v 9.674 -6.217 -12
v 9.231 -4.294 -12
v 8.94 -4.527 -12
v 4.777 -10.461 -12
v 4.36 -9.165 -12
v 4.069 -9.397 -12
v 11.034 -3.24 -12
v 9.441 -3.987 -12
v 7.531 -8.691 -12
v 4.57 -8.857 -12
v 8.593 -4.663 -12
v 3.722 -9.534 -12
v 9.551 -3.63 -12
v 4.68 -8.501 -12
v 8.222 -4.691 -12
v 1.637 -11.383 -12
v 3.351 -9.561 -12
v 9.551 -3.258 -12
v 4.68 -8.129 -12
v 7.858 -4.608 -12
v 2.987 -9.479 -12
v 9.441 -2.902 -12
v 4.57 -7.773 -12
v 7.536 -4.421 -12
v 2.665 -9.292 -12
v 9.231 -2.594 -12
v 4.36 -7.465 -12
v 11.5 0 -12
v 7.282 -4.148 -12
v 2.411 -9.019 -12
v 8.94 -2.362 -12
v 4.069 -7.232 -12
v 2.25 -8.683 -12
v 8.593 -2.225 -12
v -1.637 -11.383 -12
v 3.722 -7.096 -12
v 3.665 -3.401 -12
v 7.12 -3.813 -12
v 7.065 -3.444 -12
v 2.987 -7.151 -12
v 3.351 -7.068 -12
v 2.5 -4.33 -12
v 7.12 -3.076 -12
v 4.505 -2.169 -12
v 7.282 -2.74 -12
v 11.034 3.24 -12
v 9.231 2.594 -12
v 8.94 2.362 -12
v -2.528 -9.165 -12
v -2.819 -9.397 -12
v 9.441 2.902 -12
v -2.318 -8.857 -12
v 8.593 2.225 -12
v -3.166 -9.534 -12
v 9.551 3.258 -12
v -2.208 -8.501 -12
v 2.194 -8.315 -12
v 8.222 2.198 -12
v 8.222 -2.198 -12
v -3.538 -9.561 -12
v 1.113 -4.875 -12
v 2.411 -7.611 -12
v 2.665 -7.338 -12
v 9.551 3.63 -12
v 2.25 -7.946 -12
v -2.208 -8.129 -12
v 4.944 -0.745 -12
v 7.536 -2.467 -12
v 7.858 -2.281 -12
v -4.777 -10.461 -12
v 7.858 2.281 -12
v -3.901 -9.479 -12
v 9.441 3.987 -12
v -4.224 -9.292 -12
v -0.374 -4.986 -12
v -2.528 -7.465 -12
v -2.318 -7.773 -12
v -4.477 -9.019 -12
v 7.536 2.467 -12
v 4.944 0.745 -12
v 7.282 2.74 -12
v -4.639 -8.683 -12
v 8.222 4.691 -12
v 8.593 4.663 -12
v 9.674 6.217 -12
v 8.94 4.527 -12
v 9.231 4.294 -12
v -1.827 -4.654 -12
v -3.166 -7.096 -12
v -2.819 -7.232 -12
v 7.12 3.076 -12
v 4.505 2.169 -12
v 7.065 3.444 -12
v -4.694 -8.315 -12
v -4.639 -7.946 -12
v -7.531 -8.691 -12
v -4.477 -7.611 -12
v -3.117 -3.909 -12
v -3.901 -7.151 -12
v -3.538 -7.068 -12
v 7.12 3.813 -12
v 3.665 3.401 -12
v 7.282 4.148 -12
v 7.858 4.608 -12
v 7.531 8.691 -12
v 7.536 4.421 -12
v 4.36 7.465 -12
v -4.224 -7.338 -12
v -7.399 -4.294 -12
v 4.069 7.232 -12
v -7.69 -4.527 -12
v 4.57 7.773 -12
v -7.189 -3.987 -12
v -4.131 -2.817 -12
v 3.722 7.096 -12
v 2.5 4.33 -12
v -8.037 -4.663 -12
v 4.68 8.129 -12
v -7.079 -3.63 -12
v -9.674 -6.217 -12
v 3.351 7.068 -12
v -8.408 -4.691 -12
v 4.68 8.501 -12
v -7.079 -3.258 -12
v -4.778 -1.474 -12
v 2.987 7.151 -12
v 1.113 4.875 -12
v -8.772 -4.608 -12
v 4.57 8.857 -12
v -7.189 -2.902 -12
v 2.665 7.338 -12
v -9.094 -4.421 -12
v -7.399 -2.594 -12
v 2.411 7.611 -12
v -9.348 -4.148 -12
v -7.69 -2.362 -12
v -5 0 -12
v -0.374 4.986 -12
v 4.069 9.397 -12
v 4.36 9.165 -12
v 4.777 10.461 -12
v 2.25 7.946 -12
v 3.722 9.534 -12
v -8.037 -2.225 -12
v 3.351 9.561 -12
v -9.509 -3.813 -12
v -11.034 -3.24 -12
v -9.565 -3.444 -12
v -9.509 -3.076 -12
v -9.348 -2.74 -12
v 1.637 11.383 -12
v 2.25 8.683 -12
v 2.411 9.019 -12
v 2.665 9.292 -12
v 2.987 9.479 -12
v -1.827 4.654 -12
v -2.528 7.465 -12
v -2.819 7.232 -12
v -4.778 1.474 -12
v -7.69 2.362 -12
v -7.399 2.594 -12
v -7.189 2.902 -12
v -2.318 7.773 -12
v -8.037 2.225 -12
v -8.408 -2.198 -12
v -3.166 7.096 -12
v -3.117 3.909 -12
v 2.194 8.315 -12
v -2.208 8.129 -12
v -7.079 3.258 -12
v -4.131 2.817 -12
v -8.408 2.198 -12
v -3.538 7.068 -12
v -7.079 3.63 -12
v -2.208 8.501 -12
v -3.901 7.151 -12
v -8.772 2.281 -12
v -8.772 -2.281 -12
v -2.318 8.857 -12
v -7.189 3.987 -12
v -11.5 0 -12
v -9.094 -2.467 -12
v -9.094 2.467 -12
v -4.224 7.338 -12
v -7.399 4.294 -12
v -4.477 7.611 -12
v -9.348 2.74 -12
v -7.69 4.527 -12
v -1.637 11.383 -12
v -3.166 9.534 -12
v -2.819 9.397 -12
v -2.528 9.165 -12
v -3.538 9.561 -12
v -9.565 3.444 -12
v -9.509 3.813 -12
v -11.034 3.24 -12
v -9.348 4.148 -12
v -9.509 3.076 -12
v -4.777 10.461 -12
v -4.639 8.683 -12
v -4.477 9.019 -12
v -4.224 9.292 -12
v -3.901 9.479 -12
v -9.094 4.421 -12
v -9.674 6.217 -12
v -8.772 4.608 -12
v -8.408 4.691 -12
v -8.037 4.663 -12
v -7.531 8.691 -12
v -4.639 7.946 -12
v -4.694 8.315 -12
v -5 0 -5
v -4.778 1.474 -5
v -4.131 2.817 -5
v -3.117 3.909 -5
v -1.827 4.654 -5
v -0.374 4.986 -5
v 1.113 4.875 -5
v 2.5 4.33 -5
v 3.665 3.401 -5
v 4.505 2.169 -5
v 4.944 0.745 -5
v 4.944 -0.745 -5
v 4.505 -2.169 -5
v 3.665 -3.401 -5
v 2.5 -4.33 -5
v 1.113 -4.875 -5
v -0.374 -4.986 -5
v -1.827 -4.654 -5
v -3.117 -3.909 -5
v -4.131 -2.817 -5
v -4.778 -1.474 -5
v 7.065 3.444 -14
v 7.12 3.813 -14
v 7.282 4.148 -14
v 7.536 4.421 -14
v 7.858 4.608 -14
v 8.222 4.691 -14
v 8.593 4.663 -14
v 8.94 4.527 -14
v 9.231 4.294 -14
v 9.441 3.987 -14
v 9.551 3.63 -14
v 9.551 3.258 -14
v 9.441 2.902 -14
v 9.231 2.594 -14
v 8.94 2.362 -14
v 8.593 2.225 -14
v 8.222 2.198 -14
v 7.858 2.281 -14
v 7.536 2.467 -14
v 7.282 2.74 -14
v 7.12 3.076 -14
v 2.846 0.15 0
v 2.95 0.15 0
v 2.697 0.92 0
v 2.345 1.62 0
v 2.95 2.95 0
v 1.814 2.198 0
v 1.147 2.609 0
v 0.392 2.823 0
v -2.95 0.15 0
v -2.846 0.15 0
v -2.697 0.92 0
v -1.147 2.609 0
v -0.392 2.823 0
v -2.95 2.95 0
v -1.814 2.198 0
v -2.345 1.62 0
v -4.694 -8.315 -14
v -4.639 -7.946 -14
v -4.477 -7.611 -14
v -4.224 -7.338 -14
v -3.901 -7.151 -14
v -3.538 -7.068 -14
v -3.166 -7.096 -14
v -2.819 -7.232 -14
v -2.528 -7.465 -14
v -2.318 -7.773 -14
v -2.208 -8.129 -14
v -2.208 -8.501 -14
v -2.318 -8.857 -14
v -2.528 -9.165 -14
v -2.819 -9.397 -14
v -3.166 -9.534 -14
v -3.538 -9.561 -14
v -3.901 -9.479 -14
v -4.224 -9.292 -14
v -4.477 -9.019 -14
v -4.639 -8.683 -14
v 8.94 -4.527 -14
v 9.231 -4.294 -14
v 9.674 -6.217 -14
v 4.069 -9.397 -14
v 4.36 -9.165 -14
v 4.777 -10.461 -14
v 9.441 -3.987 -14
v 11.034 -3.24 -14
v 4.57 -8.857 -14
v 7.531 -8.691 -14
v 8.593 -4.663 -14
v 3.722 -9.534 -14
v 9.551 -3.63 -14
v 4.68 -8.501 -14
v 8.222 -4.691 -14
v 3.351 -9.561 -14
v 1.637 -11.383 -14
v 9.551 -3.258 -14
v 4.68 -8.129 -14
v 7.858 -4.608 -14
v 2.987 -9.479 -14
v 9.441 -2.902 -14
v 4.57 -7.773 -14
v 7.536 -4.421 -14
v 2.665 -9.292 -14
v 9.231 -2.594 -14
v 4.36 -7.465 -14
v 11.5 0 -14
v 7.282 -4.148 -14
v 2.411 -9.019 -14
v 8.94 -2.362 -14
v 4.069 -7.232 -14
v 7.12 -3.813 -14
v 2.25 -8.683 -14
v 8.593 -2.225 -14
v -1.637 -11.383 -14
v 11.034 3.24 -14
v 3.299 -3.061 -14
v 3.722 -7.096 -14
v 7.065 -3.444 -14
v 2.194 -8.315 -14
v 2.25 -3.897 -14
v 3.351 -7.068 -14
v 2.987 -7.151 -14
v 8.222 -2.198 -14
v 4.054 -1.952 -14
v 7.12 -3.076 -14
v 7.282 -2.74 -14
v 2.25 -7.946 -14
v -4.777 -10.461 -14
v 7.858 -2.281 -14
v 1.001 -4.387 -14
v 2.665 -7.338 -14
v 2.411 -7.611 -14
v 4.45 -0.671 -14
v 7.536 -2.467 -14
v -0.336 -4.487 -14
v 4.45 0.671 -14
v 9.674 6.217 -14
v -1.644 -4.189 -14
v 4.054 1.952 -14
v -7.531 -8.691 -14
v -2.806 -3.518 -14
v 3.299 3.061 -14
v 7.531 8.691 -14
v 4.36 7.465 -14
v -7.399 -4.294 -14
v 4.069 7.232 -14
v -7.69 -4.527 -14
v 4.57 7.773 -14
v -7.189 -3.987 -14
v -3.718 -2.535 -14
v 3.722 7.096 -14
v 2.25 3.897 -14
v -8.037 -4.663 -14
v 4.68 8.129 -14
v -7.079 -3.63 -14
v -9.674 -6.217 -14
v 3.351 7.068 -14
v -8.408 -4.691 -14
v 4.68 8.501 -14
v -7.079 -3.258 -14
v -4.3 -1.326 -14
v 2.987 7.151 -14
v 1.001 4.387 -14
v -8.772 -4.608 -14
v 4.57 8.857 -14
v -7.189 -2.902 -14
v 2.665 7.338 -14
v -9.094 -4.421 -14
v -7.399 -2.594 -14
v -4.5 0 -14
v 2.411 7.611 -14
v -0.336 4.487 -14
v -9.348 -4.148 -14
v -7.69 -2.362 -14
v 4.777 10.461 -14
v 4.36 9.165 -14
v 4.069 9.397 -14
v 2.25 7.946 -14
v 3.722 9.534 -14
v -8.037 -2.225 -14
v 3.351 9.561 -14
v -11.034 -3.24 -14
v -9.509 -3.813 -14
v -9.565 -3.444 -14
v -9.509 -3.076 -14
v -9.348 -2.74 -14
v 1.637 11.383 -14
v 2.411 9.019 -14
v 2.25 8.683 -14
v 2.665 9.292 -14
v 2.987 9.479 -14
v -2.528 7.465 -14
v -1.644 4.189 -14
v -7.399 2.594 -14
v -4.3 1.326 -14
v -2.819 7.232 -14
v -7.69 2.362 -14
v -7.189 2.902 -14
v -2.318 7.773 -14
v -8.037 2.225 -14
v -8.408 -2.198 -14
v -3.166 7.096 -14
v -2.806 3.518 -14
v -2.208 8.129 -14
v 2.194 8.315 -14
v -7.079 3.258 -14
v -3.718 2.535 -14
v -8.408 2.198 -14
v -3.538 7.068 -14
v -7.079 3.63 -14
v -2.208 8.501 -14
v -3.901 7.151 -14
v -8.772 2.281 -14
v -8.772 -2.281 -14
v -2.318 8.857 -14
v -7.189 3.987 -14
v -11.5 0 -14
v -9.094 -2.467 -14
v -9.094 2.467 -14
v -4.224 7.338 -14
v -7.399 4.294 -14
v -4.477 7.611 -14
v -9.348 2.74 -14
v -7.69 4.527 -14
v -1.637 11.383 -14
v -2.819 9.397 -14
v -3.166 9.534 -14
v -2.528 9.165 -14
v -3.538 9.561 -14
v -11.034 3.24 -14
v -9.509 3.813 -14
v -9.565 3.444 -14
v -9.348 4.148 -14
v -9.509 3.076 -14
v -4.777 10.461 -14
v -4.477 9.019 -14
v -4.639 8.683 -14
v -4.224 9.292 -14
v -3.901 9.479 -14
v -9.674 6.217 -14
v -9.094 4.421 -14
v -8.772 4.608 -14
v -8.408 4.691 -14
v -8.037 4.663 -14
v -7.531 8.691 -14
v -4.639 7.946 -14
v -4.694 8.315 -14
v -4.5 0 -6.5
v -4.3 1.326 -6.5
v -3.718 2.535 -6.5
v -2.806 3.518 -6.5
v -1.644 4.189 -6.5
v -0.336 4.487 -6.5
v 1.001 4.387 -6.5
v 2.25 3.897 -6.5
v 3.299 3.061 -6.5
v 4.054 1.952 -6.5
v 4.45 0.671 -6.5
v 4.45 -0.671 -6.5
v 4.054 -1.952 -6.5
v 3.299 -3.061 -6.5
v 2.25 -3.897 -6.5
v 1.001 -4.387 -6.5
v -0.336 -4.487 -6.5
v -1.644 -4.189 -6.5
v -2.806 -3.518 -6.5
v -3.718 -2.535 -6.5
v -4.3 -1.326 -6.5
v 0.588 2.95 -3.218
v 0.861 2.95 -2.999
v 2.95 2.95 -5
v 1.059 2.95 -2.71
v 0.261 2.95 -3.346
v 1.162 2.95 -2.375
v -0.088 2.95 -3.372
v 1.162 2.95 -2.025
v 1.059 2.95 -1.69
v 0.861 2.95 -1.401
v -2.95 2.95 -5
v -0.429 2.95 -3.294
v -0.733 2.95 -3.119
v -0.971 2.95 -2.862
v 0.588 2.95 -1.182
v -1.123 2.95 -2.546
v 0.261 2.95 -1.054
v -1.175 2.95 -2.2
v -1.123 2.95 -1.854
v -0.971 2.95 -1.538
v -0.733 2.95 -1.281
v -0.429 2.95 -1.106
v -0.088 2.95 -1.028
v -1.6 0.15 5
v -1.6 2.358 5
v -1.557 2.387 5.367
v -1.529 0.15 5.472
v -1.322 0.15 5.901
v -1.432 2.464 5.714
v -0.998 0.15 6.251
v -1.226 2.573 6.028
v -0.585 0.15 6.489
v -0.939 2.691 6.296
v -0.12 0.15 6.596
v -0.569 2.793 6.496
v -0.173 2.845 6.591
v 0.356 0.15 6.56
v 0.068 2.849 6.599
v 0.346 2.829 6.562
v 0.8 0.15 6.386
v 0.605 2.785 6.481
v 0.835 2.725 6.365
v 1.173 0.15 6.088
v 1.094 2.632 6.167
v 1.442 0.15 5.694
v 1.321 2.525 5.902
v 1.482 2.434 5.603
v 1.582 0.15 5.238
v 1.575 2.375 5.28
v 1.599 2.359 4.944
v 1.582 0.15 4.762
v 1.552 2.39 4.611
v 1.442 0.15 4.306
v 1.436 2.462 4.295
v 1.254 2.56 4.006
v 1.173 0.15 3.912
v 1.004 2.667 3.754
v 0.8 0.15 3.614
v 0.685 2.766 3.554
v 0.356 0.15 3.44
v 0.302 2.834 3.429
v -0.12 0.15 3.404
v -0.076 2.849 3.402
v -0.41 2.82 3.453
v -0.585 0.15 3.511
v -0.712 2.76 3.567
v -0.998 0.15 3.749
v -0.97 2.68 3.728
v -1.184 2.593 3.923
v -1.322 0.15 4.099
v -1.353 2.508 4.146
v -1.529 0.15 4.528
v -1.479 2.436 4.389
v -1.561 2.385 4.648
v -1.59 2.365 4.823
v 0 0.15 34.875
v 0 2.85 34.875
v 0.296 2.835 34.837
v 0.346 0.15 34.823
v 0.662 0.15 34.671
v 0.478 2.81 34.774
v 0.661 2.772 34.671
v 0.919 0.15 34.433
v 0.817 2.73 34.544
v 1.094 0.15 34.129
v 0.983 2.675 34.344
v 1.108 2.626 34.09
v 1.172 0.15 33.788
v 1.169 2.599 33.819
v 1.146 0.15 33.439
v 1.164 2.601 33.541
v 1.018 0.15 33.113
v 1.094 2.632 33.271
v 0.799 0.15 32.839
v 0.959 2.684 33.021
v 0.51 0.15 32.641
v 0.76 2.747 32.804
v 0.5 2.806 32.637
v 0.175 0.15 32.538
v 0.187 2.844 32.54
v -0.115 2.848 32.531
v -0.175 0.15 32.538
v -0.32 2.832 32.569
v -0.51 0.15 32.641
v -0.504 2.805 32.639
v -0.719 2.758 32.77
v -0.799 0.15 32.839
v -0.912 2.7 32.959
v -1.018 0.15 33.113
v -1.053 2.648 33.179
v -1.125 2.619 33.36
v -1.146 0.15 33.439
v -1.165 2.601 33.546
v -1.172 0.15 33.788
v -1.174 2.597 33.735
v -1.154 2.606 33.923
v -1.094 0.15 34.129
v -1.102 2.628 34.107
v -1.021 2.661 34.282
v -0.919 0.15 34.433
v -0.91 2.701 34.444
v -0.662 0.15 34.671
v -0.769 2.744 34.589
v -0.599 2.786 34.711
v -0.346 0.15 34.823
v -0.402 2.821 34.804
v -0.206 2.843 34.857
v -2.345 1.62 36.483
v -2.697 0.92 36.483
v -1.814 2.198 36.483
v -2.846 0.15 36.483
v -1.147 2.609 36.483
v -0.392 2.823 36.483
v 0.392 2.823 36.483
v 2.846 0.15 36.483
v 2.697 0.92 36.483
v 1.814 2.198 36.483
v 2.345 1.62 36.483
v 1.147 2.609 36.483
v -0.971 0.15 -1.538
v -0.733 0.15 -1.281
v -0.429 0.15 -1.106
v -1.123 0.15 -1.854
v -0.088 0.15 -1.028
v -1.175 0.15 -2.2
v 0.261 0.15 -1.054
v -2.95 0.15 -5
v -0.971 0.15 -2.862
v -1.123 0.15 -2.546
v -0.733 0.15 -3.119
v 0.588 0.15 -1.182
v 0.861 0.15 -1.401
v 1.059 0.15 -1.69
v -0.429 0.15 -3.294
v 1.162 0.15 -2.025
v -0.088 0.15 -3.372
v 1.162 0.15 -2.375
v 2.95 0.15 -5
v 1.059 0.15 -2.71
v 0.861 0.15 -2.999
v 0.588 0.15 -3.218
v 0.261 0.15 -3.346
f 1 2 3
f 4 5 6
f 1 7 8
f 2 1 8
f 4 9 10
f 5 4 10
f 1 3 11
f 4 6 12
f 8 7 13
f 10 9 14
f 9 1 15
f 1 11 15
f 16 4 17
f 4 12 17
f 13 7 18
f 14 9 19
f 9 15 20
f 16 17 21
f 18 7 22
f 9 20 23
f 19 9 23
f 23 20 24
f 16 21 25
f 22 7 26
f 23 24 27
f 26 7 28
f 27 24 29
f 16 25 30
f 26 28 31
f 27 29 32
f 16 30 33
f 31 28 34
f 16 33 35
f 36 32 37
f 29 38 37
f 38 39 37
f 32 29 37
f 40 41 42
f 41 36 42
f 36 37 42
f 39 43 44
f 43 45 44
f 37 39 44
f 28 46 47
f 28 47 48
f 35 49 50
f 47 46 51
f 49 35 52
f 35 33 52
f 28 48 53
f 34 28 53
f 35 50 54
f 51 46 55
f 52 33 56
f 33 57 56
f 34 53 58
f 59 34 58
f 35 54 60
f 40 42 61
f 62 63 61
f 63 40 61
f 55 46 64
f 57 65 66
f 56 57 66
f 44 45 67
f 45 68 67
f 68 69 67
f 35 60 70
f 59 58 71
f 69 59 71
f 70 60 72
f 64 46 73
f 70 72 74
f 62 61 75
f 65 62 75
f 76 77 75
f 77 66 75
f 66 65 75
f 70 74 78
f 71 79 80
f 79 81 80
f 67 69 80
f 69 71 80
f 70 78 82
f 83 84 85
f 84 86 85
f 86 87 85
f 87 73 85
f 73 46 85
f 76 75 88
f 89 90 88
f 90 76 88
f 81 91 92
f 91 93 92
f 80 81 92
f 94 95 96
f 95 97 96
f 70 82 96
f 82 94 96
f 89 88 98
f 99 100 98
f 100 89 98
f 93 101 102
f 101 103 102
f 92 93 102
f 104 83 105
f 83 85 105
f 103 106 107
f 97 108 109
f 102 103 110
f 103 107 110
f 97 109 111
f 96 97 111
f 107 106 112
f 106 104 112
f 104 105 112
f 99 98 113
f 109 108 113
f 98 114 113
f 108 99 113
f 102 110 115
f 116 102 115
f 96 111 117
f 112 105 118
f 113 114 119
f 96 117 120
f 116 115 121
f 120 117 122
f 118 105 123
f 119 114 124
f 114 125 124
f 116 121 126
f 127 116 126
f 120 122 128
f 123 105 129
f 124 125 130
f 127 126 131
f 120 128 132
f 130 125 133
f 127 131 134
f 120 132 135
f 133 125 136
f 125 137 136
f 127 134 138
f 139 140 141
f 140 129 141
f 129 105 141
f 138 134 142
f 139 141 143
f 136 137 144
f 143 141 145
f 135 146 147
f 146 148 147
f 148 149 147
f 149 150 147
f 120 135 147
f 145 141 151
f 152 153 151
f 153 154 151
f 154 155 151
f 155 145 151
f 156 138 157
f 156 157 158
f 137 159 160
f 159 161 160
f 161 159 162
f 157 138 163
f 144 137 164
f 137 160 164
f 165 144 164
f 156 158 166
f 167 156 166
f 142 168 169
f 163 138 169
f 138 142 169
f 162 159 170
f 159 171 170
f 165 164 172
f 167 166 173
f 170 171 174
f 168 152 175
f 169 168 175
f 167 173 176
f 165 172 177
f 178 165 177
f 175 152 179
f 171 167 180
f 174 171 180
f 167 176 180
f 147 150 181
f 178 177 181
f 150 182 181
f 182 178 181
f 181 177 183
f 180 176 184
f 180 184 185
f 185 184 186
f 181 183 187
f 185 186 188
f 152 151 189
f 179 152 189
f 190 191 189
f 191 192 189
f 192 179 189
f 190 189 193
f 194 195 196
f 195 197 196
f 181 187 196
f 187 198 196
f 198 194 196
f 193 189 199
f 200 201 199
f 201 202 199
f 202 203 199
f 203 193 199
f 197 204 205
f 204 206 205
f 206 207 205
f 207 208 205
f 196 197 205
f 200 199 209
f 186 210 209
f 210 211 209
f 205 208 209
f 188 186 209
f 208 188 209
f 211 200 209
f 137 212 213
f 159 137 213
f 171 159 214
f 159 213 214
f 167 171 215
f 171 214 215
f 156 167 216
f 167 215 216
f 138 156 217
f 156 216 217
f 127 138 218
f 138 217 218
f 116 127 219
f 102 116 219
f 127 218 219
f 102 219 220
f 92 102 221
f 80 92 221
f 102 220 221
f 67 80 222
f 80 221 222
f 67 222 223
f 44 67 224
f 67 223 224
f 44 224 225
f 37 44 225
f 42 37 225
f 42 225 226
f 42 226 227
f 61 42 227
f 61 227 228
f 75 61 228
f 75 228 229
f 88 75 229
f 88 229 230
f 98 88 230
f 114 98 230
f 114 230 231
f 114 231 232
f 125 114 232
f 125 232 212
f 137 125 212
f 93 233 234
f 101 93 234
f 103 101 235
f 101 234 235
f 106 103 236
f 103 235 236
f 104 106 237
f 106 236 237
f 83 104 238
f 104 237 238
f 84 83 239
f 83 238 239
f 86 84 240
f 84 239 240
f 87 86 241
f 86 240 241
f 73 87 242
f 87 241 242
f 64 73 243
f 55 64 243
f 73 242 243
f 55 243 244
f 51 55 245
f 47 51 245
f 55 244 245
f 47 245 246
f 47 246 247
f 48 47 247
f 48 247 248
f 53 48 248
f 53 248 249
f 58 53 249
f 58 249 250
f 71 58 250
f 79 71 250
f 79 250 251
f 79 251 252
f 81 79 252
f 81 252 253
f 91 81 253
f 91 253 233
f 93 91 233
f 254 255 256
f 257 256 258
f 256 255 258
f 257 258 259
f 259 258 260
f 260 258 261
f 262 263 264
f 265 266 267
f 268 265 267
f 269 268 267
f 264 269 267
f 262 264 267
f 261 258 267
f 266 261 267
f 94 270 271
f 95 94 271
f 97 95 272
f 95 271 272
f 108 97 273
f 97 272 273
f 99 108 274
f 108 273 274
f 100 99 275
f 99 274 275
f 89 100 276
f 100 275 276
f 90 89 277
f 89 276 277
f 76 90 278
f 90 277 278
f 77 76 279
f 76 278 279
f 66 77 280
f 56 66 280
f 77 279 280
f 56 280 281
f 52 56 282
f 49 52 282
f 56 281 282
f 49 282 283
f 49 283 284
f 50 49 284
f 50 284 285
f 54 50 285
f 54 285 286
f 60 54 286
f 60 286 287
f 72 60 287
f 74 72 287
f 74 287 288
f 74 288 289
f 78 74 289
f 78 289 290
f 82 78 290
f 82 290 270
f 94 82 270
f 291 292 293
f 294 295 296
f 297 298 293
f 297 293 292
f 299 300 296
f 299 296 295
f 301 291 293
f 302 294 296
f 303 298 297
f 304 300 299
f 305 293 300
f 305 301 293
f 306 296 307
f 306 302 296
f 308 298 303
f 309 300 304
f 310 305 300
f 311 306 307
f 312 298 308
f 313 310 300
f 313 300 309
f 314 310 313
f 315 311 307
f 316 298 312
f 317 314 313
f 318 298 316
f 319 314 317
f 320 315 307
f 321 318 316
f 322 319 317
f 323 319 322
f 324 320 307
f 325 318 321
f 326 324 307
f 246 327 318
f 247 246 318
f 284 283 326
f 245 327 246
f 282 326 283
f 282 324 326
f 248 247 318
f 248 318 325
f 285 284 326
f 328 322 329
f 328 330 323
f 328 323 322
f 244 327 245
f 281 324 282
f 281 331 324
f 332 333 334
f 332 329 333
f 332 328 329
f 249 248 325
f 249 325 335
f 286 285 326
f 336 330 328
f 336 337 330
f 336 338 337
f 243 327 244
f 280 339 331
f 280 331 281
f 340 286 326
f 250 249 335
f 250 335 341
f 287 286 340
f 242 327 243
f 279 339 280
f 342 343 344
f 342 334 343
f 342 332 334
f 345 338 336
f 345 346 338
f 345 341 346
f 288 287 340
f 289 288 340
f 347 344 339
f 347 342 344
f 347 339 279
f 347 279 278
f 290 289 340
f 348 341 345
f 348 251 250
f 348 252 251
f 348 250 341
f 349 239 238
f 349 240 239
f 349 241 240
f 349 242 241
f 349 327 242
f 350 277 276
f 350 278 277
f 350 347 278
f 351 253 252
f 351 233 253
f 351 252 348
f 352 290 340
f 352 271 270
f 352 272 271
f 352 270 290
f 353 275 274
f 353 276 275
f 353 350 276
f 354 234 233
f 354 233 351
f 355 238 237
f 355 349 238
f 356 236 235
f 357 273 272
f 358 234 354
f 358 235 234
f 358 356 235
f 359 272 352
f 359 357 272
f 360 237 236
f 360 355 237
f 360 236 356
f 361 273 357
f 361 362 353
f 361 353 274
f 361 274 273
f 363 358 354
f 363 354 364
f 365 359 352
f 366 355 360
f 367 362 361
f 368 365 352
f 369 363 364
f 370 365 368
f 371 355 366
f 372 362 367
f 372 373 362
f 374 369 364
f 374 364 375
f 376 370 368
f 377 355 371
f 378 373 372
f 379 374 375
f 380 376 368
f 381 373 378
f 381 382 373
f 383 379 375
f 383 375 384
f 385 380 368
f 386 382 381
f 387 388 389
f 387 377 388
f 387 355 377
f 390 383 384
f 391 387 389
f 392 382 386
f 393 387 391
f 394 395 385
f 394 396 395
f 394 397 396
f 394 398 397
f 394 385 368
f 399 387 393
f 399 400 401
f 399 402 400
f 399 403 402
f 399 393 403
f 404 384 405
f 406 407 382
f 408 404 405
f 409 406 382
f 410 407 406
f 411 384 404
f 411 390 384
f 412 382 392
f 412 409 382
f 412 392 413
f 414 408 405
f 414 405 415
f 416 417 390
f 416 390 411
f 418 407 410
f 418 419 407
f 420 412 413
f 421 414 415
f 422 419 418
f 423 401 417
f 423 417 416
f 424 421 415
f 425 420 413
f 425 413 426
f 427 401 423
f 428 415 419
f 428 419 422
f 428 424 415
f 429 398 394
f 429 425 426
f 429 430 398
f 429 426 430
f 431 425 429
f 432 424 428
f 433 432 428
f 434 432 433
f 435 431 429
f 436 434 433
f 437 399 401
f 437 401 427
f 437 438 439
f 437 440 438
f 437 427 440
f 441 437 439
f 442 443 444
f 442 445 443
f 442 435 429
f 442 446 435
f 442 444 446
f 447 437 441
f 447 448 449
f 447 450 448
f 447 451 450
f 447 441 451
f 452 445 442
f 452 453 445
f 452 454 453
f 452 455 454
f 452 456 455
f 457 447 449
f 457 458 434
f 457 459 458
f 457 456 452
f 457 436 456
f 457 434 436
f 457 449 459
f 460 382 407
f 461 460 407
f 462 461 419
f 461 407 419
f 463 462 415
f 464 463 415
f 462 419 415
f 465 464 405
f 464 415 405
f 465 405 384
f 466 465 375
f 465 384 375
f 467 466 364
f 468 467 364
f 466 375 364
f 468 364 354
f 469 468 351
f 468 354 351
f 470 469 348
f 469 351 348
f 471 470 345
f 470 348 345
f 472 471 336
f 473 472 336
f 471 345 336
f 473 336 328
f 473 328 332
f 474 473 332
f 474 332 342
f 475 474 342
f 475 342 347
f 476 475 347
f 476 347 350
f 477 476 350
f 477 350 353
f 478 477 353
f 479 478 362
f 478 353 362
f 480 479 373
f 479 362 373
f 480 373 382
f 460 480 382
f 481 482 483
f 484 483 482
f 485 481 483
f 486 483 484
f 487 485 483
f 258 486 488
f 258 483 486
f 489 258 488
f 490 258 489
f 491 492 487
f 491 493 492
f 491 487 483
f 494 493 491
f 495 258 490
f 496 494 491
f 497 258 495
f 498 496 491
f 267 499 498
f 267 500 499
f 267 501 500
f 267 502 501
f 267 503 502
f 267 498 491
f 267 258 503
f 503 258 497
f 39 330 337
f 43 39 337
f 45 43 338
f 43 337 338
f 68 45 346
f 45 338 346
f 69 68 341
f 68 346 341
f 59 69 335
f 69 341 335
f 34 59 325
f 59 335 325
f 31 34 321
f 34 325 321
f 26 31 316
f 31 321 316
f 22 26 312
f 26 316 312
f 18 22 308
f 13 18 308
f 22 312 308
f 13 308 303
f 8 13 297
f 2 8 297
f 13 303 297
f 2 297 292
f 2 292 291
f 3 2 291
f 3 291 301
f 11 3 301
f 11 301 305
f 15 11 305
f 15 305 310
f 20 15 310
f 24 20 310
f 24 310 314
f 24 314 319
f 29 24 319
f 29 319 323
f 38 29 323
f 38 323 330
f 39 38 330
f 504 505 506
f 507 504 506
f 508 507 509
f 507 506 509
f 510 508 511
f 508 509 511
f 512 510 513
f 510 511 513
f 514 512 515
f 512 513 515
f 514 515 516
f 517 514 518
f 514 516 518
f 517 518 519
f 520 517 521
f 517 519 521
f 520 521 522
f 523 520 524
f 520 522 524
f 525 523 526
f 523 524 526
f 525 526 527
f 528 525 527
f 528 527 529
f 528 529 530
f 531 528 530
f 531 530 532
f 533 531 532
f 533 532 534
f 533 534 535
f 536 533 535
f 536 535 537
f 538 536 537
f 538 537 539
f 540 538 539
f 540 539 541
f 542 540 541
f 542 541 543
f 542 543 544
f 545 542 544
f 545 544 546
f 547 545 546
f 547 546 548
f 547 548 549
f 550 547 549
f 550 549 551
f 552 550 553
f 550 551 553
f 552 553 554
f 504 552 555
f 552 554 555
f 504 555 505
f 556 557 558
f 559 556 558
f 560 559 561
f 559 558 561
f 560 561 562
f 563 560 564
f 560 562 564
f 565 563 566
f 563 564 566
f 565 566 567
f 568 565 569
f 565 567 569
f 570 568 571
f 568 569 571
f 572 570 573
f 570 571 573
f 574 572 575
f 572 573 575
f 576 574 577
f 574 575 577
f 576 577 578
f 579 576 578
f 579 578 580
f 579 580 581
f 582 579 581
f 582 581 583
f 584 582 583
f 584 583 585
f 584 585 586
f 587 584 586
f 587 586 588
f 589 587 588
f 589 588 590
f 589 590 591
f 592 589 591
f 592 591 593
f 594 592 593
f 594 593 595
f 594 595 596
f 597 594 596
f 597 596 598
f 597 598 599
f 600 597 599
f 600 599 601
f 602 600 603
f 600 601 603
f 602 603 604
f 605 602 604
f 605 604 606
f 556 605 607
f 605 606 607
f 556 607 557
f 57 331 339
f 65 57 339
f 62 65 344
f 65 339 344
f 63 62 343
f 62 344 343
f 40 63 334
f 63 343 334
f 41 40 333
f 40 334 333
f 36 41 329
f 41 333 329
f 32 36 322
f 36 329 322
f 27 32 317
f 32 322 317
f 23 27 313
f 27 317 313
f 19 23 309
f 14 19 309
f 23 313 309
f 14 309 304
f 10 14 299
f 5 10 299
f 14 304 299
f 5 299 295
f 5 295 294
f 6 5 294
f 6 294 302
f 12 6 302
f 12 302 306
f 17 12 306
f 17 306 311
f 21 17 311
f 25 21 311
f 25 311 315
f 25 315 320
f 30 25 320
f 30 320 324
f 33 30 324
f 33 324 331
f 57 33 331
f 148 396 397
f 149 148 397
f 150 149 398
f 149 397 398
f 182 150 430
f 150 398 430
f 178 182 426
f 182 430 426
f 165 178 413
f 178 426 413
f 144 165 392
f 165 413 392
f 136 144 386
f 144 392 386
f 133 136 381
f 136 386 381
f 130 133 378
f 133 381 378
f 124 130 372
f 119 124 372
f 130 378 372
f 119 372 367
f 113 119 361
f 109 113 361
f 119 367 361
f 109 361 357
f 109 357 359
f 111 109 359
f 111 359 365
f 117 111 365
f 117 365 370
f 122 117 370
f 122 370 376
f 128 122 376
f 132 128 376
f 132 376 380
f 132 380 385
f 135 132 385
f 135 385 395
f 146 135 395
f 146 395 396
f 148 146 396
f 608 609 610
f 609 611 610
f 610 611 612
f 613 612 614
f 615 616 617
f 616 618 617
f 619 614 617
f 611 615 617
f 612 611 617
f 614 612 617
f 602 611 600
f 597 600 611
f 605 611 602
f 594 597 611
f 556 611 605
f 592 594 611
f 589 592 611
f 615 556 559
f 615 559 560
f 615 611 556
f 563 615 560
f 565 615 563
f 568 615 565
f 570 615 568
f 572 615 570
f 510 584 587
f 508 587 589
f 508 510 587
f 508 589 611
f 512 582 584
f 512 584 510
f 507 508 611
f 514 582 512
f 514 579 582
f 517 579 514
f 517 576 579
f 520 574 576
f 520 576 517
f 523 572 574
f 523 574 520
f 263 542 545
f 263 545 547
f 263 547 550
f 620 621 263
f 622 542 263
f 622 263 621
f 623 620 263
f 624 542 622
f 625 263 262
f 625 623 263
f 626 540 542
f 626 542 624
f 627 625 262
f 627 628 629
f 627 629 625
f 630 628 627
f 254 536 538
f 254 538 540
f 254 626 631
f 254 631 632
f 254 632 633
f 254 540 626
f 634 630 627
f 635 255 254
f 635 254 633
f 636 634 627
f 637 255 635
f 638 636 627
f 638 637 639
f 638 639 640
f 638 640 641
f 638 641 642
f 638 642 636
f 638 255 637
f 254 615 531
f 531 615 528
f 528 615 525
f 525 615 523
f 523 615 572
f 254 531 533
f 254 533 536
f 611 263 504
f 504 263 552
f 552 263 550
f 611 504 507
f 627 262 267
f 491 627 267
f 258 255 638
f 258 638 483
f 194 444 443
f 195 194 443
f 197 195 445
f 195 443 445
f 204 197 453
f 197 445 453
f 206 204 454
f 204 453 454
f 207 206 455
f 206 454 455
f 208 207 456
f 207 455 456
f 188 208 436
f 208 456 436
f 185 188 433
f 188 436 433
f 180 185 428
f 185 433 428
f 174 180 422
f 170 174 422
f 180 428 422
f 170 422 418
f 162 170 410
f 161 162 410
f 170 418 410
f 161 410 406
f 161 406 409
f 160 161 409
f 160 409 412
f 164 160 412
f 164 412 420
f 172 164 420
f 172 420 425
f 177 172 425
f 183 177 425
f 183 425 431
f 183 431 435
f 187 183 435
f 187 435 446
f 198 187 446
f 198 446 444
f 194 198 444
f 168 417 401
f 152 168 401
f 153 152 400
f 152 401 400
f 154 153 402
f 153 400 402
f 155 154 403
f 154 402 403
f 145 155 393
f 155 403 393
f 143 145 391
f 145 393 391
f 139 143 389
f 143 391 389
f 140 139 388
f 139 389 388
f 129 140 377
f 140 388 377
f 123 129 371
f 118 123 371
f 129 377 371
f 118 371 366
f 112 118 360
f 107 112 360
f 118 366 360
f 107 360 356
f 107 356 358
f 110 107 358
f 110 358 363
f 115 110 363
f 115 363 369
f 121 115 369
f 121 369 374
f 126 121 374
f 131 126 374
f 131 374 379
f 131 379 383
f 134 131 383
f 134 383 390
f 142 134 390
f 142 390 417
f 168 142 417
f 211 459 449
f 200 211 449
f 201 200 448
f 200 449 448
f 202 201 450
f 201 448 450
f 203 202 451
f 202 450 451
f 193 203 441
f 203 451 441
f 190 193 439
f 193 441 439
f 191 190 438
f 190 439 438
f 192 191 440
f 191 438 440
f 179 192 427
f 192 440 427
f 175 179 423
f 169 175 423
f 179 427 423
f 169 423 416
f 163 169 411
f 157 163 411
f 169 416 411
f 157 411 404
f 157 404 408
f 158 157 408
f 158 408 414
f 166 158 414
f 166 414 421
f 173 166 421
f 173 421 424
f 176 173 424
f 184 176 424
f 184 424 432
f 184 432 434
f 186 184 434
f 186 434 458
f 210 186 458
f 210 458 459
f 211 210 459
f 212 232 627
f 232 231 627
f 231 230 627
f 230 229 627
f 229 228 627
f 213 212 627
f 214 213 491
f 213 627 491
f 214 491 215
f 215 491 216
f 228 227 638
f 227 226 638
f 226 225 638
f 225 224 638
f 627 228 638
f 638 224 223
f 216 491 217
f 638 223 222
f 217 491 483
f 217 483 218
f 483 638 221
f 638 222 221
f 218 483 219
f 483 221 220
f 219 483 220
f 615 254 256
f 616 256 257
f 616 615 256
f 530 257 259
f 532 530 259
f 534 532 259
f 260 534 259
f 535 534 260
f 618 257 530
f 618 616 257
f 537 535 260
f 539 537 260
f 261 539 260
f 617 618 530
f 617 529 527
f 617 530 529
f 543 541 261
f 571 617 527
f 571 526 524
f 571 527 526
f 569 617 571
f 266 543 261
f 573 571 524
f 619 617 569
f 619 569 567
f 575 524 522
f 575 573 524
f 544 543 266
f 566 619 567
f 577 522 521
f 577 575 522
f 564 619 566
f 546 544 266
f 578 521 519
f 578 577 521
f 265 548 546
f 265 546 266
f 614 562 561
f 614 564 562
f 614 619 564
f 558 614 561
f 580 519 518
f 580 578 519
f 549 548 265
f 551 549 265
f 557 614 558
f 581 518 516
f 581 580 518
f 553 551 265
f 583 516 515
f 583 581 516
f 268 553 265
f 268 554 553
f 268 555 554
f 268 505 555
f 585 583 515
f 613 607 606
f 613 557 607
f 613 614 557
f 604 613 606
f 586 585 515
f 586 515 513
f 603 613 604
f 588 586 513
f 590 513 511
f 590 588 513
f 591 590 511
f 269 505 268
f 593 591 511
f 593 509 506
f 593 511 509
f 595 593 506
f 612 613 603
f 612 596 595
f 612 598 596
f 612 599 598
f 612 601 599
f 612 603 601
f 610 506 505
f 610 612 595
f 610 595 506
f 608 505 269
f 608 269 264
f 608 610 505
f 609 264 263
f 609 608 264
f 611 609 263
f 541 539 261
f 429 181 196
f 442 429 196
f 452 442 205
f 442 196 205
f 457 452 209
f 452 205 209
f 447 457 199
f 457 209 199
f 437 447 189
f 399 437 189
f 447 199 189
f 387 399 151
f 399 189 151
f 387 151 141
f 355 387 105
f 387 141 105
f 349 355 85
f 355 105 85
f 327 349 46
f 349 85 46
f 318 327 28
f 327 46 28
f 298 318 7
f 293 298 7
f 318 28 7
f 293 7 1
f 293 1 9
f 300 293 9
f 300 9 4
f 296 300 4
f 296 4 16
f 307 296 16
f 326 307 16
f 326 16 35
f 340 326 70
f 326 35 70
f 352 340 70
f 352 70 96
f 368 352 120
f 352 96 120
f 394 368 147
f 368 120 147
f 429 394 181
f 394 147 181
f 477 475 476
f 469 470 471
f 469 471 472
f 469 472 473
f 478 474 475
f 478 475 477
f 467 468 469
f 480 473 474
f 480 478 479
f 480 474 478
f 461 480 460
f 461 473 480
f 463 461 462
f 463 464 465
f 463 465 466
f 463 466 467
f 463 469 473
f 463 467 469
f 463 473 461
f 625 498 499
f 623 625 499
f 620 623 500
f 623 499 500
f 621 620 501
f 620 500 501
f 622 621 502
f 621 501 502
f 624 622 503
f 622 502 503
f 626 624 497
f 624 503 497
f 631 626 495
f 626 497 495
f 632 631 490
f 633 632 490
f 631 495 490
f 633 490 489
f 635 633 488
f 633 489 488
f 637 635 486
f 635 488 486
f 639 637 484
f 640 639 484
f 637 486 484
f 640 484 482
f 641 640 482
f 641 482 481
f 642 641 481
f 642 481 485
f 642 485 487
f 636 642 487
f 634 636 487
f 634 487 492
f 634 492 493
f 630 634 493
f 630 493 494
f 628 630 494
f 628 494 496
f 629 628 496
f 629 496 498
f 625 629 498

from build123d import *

# Parameters (mm, degrees)
SKETCH_1_R           = 2.85
EXTRUDE_1_DEPTH      = 31.5
SKETCH_3_W           = 5.9
SKETCH_3_H           = 5.9
EXTRUDE_2_DEPTH      = 5
SKETCH_4_R           = 5
EXTRUDE_3_DEPTH      = 7
SKETCH_6_R           = 11.5
EXTRUDE_4_DEPTH      = 2
SKETCH_8_R           = 4.5
CUT_EXTRUDE_2_DEPTH  = 7.5
SKETCH_9_R           = 1.25
CUT_EXTRUDE_3_DEPTH  = 5.5
SKETCH_10_R          = 1.175
CUT_EXTRUDE_7_DEPTH  = 10
SKETCH_12_W          = 5.9
SKETCH_12_H          = 5.9
EXTRUDE_5_DEPTH      = 45
SKETCH_15_W          = 5.9
SKETCH_15_H          = 20.04910328
EXTRUDE_6_DEPTH      = 6
SKETCH_16_R          = 1.175
CUT_EXTRUDE_8_DEPTH  = 10
SKETCH_18_W          = 41.5
SKETCH_18_H          = 3.1
CUT_EXTRUDE_9_DEPTH  = 10
SKETCH_19_W          = 46.016613228
SKETCH_19_H          = 26.924390235
CUT_EXTRUDE_10_DEPTH = 10
SKETCH_21_OUTSIDE_W  = 37.01
SKETCH_21_OUTSIDE_H  = 37.01
SKETCH_21_OUTSIDE_R  = 2.85
CUT_EXTRUDE_11_DEPTH = 10
SKETCH_22_R          = 1.6
CUT_EXTRUDE_12_DEPTH = 3


with BuildPart() as part:
    # 스케치1 → 보스-돌출1 (new body)
    with BuildSketch(Plane.XY):
        Circle(SKETCH_1_R)
    extrude(amount=EXTRUDE_1_DEPTH)

    # 스케치3 → 보스-돌출2 (add)
    with BuildSketch(Plane(origin=(0, 0, 0), x_dir=(-1, 0, 0), z_dir=(0, 0, -1))):
        Rectangle(SKETCH_3_W, SKETCH_3_H)
    extrude(amount=EXTRUDE_2_DEPTH)

    # 스케치4 → 보스-돌출3 (add)
    with BuildSketch(Plane(origin=(0, 0, -5), x_dir=(-1, 0, 0), z_dir=(0, 0, -1))):
        Circle(SKETCH_4_R)
    extrude(amount=EXTRUDE_3_DEPTH)

    # 스케치6 → 보스-돌출4 (add)
    with BuildSketch(Plane(origin=(0, 0, -12), x_dir=(-1, 0, 0), z_dir=(0, 0, -1))):
        Circle(SKETCH_6_R)
    extrude(amount=EXTRUDE_4_DEPTH)

    # 스케치8 → 컷-돌출2 (cut)
    with BuildSketch(Plane(origin=(0, 0, -14), x_dir=(-1, 0, 0), z_dir=(0, 0, -1))):
        Circle(SKETCH_8_R)
    extrude(amount=-CUT_EXTRUDE_2_DEPTH, mode=Mode.SUBTRACT)

    # 스케치9 → 컷-돌출3 (cut)
    with BuildSketch(Plane(origin=(0, 0, -14), x_dir=(-1, 0, 0), z_dir=(0, 0, -1))):
        with Locations((3.444150891, 8.314915793)):
            Circle(SKETCH_9_R)
        with Locations((-3.444150891, 8.314915793)):
            Circle(SKETCH_9_R)
        with Locations((8.314915793, 3.444150891)):
            Circle(SKETCH_9_R)
        with Locations((8.314915793, -3.444150891)):
            Circle(SKETCH_9_R)
        with Locations((3.444150891, -8.314915793)):
            Circle(SKETCH_9_R)
        with Locations((-3.444150891, -8.314915793)):
            Circle(SKETCH_9_R)
        with Locations((-8.314915793, -3.444150891)):
            Circle(SKETCH_9_R)
        with Locations((-8.314915793, 3.444150891)):
            Circle(SKETCH_9_R)
    extrude(amount=-CUT_EXTRUDE_3_DEPTH, mode=Mode.SUBTRACT)

    # 스케치10 → 컷-돌출7 (cut)
    with BuildSketch(Plane(origin=(0, 2.95, 0), x_dir=(1, 0, 0), z_dir=(0, 1, 0))):
        with Locations(Location((0, 2.2, 0), (0, 0, 180))):
            Circle(SKETCH_10_R)
    extrude(amount=-CUT_EXTRUDE_7_DEPTH, mode=Mode.SUBTRACT)

    # 스케치12 → 보스-돌출5 (add)
    with BuildSketch(Plane.XY.offset(31.5)):
        Rectangle(SKETCH_12_W, SKETCH_12_H)
    extrude(amount=EXTRUDE_5_DEPTH)

    # 스케치15 → 보스-돌출6 (add)
    with BuildSketch(Plane.XY.offset(76.5)):
        Rectangle(SKETCH_15_W, SKETCH_15_H)
    extrude(amount=EXTRUDE_6_DEPTH)

    # 스케치16 → 컷-돌출8 (cut)
    with BuildSketch(Plane(origin=(0, 2.95, 0), x_dir=(1, 0, 0), z_dir=(0, 1, 0))):
        with Locations(Location((0, -33.7, 0), (0, 0, 270))):
            Circle(SKETCH_16_R)
    extrude(amount=-CUT_EXTRUDE_8_DEPTH, mode=Mode.SUBTRACT)

    # 스케치18 → 컷-돌출9 (cut)
    with BuildSketch(Plane(origin=(2.95, 0, 0), x_dir=(0, 0, -1), z_dir=(1, 0, 0))):
        with Locations((-15.75, -1.4)):
            Rectangle(SKETCH_18_W, SKETCH_18_H)
    extrude(amount=-CUT_EXTRUDE_9_DEPTH, mode=Mode.SUBTRACT)

    # 스케치19 → 컷-돌출10 (cut)
    with BuildSketch(Plane(origin=(2.95, 0, 0), x_dir=(0, 0, -1), z_dir=(1, 0, 0))):
        with Locations((-59.491693386, -3.437643478)):
            Rectangle(SKETCH_19_W, SKETCH_19_H)
    extrude(amount=-CUT_EXTRUDE_10_DEPTH, mode=Mode.SUBTRACT)

    # 스케치21 outside → 컷-돌출11 (cut)
    with BuildSketch(Plane.XY.offset(36.483386772)):
        Rectangle(SKETCH_21_OUTSIDE_W, SKETCH_21_OUTSIDE_H)
        Circle(SKETCH_21_OUTSIDE_R, mode=Mode.SUBTRACT)
    extrude(amount=-CUT_EXTRUDE_11_DEPTH, mode=Mode.SUBTRACT)

    # 스케치22 → 컷-돌출12 (cut)
    with BuildSketch(Plane(origin=(0, 2.95, 0), x_dir=(1, 0, 0), z_dir=(0, 1, 0))):
        with Locations(Location((0, -5, 0), (0, 0, 180))):
            Circle(SKETCH_22_R)
    extrude(amount=-CUT_EXTRUDE_12_DEPTH, mode=Mode.SUBTRACT)


solid = part.part
